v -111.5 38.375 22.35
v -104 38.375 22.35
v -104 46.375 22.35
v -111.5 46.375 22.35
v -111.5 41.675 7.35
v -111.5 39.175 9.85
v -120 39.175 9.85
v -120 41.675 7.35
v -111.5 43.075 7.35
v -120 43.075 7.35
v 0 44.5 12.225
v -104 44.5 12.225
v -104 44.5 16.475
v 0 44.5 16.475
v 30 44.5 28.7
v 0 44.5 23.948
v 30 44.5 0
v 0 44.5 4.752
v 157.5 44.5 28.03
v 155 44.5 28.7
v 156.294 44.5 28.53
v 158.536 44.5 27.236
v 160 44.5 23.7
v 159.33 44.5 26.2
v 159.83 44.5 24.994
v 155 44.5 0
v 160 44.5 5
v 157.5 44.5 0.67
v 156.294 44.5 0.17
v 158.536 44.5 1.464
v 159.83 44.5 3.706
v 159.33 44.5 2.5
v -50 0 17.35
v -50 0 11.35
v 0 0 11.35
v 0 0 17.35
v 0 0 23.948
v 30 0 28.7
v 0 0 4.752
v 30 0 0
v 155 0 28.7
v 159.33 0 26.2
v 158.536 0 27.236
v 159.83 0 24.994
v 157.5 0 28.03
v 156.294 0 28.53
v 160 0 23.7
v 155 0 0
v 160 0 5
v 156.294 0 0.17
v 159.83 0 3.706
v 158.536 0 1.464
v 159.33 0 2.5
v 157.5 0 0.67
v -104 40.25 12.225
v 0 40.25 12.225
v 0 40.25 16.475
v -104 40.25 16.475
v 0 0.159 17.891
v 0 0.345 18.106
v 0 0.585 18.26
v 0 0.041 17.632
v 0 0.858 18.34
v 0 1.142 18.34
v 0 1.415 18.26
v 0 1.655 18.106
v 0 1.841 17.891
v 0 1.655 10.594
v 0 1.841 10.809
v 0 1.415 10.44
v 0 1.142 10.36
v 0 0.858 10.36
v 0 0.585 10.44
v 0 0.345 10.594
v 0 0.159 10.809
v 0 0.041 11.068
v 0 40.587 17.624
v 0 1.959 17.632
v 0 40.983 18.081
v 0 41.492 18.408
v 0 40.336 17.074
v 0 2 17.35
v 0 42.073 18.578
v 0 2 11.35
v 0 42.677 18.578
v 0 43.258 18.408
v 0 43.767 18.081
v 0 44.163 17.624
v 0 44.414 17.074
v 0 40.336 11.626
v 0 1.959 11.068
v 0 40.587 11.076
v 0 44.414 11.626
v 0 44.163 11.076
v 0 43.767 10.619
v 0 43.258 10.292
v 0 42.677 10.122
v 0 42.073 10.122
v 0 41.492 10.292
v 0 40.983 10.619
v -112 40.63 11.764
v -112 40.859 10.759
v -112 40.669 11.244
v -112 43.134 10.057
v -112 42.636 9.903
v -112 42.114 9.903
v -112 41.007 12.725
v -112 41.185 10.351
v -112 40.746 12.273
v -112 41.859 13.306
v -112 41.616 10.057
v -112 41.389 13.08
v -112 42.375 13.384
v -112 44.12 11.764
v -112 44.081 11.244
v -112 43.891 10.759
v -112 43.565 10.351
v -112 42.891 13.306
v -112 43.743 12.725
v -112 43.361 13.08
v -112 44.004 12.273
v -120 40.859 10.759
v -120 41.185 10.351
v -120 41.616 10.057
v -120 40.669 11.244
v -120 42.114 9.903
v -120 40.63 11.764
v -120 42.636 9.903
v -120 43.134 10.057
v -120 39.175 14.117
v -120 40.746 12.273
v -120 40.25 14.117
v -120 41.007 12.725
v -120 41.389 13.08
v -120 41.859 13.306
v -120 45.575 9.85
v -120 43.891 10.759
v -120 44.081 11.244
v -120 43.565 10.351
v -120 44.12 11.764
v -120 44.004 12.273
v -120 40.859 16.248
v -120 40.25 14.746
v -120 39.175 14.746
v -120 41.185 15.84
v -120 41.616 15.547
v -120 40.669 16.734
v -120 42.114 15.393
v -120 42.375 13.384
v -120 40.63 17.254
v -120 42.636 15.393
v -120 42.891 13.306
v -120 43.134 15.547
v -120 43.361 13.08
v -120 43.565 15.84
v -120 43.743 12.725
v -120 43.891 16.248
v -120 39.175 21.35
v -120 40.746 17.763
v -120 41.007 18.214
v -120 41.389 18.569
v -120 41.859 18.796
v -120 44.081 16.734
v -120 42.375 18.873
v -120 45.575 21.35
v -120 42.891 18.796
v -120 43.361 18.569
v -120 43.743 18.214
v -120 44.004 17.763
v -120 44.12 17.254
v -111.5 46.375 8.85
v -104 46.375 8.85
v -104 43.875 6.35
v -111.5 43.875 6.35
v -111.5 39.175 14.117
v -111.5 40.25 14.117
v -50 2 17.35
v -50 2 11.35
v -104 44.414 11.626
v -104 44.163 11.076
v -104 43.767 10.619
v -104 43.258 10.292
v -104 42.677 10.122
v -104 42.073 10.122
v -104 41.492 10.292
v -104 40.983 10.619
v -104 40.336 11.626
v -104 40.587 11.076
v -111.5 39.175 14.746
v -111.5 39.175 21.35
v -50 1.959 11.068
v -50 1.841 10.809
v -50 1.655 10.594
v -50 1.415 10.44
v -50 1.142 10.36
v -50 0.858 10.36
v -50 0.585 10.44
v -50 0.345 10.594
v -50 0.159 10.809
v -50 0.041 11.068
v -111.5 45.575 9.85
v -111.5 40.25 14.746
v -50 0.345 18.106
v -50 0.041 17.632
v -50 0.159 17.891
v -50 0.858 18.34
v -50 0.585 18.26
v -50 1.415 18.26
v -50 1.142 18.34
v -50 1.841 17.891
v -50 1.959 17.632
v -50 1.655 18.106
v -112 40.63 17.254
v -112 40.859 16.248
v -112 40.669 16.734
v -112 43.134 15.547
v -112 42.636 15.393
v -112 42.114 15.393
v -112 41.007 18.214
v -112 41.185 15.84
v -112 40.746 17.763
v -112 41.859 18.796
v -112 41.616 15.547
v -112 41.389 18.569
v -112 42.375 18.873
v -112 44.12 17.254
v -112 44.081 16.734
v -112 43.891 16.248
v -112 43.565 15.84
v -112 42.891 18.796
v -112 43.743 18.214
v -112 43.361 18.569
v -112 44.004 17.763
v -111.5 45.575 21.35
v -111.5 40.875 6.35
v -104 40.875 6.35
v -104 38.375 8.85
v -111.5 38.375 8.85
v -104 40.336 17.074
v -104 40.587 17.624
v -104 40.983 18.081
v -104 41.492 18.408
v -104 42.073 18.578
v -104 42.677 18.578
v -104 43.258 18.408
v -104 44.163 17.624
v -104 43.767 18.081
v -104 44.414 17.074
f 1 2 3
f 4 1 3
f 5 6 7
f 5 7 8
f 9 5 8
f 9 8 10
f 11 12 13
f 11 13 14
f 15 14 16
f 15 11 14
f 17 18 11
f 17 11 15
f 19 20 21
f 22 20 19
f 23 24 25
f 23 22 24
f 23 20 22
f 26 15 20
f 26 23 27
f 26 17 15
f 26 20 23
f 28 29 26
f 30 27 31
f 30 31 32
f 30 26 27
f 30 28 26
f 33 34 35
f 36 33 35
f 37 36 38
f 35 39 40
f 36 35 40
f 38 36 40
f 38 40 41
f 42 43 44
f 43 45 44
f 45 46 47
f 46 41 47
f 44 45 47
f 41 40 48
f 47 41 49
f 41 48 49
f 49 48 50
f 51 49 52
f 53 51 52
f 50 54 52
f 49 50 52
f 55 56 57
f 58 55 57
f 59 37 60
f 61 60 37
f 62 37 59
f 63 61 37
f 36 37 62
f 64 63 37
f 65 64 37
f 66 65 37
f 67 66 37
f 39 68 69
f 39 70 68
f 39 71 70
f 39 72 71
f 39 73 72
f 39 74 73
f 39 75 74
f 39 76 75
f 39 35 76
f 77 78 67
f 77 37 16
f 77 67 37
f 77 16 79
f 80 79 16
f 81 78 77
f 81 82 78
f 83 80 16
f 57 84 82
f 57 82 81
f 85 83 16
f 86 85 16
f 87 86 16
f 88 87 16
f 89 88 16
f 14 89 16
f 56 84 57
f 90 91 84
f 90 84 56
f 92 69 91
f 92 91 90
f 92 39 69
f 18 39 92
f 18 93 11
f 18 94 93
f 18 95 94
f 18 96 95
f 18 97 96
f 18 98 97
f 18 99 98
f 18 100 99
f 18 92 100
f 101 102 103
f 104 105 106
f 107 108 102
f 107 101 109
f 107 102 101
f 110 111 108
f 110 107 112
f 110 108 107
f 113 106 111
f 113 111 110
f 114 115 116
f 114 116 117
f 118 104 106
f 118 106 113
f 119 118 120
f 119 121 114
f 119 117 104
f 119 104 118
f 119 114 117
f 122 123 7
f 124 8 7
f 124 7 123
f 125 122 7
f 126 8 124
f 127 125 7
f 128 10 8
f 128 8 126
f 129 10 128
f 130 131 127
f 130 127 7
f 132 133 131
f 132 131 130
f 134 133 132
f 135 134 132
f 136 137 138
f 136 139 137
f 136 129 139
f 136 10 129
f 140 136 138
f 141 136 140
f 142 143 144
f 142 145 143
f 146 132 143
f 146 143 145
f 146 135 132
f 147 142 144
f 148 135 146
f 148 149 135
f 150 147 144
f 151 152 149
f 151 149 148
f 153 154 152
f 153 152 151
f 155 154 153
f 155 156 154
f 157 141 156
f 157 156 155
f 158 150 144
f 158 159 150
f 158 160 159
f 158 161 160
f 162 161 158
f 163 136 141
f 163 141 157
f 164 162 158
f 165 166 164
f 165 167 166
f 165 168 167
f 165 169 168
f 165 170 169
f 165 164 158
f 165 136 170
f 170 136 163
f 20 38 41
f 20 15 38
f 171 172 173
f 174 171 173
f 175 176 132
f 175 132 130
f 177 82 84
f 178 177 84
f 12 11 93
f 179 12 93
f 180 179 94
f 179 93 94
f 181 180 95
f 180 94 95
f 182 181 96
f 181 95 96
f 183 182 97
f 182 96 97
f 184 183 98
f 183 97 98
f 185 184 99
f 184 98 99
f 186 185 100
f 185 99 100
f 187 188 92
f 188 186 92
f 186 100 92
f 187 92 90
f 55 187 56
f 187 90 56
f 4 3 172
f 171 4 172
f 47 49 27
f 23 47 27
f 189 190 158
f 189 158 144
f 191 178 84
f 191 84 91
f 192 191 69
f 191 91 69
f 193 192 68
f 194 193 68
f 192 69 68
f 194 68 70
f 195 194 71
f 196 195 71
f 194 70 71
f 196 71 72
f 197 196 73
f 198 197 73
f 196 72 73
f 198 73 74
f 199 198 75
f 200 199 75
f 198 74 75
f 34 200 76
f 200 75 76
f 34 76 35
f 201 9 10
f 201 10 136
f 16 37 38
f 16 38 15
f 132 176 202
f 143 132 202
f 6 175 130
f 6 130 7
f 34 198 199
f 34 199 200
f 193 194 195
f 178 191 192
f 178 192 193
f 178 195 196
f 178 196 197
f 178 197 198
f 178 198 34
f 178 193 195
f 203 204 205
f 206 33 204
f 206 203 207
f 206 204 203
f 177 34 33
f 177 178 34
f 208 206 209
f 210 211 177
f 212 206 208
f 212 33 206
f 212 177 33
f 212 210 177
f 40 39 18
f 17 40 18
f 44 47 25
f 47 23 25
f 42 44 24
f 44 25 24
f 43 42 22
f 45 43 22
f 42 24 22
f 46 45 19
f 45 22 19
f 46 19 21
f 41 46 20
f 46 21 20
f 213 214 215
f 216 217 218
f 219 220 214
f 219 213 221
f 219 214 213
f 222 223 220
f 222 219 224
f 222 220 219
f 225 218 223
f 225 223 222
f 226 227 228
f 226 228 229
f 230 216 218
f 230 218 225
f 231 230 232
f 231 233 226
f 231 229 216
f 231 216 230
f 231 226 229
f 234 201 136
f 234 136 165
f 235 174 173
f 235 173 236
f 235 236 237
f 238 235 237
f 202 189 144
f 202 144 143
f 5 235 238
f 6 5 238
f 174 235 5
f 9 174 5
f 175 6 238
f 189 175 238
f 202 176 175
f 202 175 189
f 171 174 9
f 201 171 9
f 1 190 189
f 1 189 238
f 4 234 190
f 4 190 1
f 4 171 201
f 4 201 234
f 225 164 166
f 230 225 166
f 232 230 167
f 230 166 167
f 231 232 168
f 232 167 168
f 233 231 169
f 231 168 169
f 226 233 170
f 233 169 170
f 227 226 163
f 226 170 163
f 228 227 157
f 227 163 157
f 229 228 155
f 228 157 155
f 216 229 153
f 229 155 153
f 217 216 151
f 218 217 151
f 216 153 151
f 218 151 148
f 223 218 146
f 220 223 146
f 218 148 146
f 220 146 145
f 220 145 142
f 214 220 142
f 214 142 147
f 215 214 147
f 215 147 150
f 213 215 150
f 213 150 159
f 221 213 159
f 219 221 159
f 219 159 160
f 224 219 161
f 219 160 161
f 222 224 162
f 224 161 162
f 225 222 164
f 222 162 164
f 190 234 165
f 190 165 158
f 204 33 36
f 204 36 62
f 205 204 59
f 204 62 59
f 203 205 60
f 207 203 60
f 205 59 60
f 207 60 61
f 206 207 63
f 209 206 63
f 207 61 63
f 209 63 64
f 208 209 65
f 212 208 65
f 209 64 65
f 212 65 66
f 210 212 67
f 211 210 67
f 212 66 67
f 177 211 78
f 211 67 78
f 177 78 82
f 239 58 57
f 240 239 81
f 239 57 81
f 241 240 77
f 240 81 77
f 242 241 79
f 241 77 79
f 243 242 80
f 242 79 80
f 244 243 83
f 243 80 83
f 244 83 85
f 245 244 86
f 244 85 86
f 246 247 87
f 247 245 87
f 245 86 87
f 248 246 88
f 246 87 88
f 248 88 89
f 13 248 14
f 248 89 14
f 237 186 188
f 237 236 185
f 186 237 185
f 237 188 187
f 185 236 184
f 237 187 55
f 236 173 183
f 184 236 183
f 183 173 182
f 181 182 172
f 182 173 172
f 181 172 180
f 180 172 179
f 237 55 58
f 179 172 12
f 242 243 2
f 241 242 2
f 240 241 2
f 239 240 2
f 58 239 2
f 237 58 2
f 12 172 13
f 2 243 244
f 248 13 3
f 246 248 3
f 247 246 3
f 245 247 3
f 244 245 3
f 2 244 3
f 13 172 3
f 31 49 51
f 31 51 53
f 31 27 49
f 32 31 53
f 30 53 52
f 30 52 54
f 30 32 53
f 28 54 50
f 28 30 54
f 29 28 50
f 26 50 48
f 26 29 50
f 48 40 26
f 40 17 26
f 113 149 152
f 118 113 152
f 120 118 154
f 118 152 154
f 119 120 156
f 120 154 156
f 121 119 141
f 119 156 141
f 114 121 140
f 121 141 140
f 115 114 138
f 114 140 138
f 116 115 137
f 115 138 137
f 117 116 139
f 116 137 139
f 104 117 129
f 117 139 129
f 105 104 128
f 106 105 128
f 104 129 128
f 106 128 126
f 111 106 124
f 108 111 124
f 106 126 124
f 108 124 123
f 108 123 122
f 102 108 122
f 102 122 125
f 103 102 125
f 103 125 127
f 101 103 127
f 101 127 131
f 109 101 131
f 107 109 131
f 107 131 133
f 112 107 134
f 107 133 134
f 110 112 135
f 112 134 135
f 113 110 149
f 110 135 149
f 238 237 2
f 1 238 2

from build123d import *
from OCP.BRepFilletAPI import BRepFilletAPI_MakeChamfer

# Parameters (mm, degrees)
SKETCH_1_W          = 160
SKETCH_1_H          = 44.5
EXTRUDE_1_DEPTH     = 28.7
FILLET_1_R          = 5
CHAMFER_1_SIZE      = 30
CHAMFER_1_SIZE2     = 4.75153321
EXTRUDE_6_DEPTH     = 120
EXTRUDE_7_DEPTH     = 50
EXTRUDE_8_DEPTH     = 7.5
SKETCH_3_3_R        = 1.75
EXTRUDE_9_DEPTH     = 16
SKETCH_4_R          = 1.75
CUT_EXTRUDE_1_DEPTH = 8


with BuildPart() as part:
    # 草圖1 → 填料-伸長1 (new body)
    with BuildSketch(Plane.XY):
        with Locations((80, 22.25)):
            Rectangle(SKETCH_1_W, SKETCH_1_H)
    extrude(amount=EXTRUDE_1_DEPTH)

    # 圓角1
    fillet_1_edges = [part.edges().sort_by_distance(p)[0] for p in [
        (160, 22.25, 0),
        (160, 22.25, 28.7),
    ]]
    fillet(fillet_1_edges, radius=FILLET_1_R)

    # 導角1: one chamfer whose edges measure the first distance from different faces: ONE call of the kernel's chamfer builder (chamfer() names one face for all edges)
    chamfer_1_edges_1 = [part.edges().sort_by_distance(p)[0] for p in [
        (0, 22.25, 28.7),
    ]]
    chamfer_1_side_1 = [part.faces().sort_by_distance(p)[0] for p in [
        (77.5, 22.25, 28.7),
    ]]
    chamfer_1_edges_2 = [part.edges().sort_by_distance(p)[0] for p in [
        (0, 22.25, 0),
    ]]
    chamfer_1_side_2 = [part.faces().sort_by_distance(p)[0] for p in [
        (77.5, 22.25, 0),
    ]]
    chamfer_1 = BRepFilletAPI_MakeChamfer(part.part.solid().wrapped)
    for e in chamfer_1_edges_1:
        chamfer_1.Add(CHAMFER_1_SIZE, CHAMFER_1_SIZE2, e.wrapped, chamfer_1_side_1[0].wrapped)  # the first distance lies on this face
    for e in chamfer_1_edges_2:
        chamfer_1.Add(CHAMFER_1_SIZE, CHAMFER_1_SIZE2, e.wrapped, chamfer_1_side_2[0].wrapped)  # the first distance lies on this face
    add(Compound.cast(chamfer_1.Shape()), mode=Mode.REPLACE)

    # 草圖2 → 填料-伸長6 (add)
    with BuildSketch(Plane.ZY):
        with BuildLine():
            Line((16.475, 44.5), (12.225, 44.5))
            ThreePointArc((12.225, 44.5), (10.1, 42.375), (12.225, 40.25))
            Line((12.225, 40.25), (16.474999883, 40.25))
            ThreePointArc((16.474999883, 40.25), (18.6, 42.374999942), (16.475, 44.5))
        make_face()
    extrude(amount=EXTRUDE_6_DEPTH)

    # 草圖2<3> → 填料-伸長7 (add)
    with BuildSketch(Plane.ZY):
        with BuildLine():
            ThreePointArc((11.35, 2), (10.35, 1), (11.35, 0))
            Line((11.35, 0), (17.35, 0))
            ThreePointArc((17.35, 0), (18.35, 1), (17.35, 2))
            Line((17.35, 2), (11.35, 2))
        make_face()
    extrude(amount=EXTRUDE_7_DEPTH)

    # 草圖3 → 填料-伸長8 (add)
    with BuildSketch(Plane.ZY.offset(104)):
        Polygon((22.35, 46.375), (8.85, 46.375), (6.35, 43.875), (6.35, 40.875), (8.85, 38.375), (22.35, 38.375), align=None)
    extrude(amount=EXTRUDE_8_DEPTH)

    # 草圖3<3> → 填料-伸長9 (add)
    with BuildSketch(Plane.ZY.offset(104)):
        Polygon((9.85, 45.575), (7.35, 43.075), (7.35, 41.675), (9.85, 39.175), (14.11665296, 39.175), (14.11665296, 40.489122918), (14.746028023, 40.489122918), (14.746028023, 39.175), (21.35, 39.175), (21.35, 45.575), align=None)
        with Locations((12.225, 42.375)):
            Circle(SKETCH_3_3_R, mode=Mode.SUBTRACT)
        with Locations((16.475, 42.375)):
            Circle(SKETCH_3_3_R, mode=Mode.SUBTRACT)
    extrude(amount=EXTRUDE_9_DEPTH)

    # 草圖4 → 除料-伸長1 (cut)
    with BuildSketch(Plane.ZY.offset(120)):
        with Locations((11.633674327, 42.375)):
            Circle(SKETCH_4_R)
        with Locations((17.123250996, 42.375)):
            Circle(SKETCH_4_R)
    extrude(amount=-CUT_EXTRUDE_1_DEPTH, mode=Mode.SUBTRACT)


solid = part.part
